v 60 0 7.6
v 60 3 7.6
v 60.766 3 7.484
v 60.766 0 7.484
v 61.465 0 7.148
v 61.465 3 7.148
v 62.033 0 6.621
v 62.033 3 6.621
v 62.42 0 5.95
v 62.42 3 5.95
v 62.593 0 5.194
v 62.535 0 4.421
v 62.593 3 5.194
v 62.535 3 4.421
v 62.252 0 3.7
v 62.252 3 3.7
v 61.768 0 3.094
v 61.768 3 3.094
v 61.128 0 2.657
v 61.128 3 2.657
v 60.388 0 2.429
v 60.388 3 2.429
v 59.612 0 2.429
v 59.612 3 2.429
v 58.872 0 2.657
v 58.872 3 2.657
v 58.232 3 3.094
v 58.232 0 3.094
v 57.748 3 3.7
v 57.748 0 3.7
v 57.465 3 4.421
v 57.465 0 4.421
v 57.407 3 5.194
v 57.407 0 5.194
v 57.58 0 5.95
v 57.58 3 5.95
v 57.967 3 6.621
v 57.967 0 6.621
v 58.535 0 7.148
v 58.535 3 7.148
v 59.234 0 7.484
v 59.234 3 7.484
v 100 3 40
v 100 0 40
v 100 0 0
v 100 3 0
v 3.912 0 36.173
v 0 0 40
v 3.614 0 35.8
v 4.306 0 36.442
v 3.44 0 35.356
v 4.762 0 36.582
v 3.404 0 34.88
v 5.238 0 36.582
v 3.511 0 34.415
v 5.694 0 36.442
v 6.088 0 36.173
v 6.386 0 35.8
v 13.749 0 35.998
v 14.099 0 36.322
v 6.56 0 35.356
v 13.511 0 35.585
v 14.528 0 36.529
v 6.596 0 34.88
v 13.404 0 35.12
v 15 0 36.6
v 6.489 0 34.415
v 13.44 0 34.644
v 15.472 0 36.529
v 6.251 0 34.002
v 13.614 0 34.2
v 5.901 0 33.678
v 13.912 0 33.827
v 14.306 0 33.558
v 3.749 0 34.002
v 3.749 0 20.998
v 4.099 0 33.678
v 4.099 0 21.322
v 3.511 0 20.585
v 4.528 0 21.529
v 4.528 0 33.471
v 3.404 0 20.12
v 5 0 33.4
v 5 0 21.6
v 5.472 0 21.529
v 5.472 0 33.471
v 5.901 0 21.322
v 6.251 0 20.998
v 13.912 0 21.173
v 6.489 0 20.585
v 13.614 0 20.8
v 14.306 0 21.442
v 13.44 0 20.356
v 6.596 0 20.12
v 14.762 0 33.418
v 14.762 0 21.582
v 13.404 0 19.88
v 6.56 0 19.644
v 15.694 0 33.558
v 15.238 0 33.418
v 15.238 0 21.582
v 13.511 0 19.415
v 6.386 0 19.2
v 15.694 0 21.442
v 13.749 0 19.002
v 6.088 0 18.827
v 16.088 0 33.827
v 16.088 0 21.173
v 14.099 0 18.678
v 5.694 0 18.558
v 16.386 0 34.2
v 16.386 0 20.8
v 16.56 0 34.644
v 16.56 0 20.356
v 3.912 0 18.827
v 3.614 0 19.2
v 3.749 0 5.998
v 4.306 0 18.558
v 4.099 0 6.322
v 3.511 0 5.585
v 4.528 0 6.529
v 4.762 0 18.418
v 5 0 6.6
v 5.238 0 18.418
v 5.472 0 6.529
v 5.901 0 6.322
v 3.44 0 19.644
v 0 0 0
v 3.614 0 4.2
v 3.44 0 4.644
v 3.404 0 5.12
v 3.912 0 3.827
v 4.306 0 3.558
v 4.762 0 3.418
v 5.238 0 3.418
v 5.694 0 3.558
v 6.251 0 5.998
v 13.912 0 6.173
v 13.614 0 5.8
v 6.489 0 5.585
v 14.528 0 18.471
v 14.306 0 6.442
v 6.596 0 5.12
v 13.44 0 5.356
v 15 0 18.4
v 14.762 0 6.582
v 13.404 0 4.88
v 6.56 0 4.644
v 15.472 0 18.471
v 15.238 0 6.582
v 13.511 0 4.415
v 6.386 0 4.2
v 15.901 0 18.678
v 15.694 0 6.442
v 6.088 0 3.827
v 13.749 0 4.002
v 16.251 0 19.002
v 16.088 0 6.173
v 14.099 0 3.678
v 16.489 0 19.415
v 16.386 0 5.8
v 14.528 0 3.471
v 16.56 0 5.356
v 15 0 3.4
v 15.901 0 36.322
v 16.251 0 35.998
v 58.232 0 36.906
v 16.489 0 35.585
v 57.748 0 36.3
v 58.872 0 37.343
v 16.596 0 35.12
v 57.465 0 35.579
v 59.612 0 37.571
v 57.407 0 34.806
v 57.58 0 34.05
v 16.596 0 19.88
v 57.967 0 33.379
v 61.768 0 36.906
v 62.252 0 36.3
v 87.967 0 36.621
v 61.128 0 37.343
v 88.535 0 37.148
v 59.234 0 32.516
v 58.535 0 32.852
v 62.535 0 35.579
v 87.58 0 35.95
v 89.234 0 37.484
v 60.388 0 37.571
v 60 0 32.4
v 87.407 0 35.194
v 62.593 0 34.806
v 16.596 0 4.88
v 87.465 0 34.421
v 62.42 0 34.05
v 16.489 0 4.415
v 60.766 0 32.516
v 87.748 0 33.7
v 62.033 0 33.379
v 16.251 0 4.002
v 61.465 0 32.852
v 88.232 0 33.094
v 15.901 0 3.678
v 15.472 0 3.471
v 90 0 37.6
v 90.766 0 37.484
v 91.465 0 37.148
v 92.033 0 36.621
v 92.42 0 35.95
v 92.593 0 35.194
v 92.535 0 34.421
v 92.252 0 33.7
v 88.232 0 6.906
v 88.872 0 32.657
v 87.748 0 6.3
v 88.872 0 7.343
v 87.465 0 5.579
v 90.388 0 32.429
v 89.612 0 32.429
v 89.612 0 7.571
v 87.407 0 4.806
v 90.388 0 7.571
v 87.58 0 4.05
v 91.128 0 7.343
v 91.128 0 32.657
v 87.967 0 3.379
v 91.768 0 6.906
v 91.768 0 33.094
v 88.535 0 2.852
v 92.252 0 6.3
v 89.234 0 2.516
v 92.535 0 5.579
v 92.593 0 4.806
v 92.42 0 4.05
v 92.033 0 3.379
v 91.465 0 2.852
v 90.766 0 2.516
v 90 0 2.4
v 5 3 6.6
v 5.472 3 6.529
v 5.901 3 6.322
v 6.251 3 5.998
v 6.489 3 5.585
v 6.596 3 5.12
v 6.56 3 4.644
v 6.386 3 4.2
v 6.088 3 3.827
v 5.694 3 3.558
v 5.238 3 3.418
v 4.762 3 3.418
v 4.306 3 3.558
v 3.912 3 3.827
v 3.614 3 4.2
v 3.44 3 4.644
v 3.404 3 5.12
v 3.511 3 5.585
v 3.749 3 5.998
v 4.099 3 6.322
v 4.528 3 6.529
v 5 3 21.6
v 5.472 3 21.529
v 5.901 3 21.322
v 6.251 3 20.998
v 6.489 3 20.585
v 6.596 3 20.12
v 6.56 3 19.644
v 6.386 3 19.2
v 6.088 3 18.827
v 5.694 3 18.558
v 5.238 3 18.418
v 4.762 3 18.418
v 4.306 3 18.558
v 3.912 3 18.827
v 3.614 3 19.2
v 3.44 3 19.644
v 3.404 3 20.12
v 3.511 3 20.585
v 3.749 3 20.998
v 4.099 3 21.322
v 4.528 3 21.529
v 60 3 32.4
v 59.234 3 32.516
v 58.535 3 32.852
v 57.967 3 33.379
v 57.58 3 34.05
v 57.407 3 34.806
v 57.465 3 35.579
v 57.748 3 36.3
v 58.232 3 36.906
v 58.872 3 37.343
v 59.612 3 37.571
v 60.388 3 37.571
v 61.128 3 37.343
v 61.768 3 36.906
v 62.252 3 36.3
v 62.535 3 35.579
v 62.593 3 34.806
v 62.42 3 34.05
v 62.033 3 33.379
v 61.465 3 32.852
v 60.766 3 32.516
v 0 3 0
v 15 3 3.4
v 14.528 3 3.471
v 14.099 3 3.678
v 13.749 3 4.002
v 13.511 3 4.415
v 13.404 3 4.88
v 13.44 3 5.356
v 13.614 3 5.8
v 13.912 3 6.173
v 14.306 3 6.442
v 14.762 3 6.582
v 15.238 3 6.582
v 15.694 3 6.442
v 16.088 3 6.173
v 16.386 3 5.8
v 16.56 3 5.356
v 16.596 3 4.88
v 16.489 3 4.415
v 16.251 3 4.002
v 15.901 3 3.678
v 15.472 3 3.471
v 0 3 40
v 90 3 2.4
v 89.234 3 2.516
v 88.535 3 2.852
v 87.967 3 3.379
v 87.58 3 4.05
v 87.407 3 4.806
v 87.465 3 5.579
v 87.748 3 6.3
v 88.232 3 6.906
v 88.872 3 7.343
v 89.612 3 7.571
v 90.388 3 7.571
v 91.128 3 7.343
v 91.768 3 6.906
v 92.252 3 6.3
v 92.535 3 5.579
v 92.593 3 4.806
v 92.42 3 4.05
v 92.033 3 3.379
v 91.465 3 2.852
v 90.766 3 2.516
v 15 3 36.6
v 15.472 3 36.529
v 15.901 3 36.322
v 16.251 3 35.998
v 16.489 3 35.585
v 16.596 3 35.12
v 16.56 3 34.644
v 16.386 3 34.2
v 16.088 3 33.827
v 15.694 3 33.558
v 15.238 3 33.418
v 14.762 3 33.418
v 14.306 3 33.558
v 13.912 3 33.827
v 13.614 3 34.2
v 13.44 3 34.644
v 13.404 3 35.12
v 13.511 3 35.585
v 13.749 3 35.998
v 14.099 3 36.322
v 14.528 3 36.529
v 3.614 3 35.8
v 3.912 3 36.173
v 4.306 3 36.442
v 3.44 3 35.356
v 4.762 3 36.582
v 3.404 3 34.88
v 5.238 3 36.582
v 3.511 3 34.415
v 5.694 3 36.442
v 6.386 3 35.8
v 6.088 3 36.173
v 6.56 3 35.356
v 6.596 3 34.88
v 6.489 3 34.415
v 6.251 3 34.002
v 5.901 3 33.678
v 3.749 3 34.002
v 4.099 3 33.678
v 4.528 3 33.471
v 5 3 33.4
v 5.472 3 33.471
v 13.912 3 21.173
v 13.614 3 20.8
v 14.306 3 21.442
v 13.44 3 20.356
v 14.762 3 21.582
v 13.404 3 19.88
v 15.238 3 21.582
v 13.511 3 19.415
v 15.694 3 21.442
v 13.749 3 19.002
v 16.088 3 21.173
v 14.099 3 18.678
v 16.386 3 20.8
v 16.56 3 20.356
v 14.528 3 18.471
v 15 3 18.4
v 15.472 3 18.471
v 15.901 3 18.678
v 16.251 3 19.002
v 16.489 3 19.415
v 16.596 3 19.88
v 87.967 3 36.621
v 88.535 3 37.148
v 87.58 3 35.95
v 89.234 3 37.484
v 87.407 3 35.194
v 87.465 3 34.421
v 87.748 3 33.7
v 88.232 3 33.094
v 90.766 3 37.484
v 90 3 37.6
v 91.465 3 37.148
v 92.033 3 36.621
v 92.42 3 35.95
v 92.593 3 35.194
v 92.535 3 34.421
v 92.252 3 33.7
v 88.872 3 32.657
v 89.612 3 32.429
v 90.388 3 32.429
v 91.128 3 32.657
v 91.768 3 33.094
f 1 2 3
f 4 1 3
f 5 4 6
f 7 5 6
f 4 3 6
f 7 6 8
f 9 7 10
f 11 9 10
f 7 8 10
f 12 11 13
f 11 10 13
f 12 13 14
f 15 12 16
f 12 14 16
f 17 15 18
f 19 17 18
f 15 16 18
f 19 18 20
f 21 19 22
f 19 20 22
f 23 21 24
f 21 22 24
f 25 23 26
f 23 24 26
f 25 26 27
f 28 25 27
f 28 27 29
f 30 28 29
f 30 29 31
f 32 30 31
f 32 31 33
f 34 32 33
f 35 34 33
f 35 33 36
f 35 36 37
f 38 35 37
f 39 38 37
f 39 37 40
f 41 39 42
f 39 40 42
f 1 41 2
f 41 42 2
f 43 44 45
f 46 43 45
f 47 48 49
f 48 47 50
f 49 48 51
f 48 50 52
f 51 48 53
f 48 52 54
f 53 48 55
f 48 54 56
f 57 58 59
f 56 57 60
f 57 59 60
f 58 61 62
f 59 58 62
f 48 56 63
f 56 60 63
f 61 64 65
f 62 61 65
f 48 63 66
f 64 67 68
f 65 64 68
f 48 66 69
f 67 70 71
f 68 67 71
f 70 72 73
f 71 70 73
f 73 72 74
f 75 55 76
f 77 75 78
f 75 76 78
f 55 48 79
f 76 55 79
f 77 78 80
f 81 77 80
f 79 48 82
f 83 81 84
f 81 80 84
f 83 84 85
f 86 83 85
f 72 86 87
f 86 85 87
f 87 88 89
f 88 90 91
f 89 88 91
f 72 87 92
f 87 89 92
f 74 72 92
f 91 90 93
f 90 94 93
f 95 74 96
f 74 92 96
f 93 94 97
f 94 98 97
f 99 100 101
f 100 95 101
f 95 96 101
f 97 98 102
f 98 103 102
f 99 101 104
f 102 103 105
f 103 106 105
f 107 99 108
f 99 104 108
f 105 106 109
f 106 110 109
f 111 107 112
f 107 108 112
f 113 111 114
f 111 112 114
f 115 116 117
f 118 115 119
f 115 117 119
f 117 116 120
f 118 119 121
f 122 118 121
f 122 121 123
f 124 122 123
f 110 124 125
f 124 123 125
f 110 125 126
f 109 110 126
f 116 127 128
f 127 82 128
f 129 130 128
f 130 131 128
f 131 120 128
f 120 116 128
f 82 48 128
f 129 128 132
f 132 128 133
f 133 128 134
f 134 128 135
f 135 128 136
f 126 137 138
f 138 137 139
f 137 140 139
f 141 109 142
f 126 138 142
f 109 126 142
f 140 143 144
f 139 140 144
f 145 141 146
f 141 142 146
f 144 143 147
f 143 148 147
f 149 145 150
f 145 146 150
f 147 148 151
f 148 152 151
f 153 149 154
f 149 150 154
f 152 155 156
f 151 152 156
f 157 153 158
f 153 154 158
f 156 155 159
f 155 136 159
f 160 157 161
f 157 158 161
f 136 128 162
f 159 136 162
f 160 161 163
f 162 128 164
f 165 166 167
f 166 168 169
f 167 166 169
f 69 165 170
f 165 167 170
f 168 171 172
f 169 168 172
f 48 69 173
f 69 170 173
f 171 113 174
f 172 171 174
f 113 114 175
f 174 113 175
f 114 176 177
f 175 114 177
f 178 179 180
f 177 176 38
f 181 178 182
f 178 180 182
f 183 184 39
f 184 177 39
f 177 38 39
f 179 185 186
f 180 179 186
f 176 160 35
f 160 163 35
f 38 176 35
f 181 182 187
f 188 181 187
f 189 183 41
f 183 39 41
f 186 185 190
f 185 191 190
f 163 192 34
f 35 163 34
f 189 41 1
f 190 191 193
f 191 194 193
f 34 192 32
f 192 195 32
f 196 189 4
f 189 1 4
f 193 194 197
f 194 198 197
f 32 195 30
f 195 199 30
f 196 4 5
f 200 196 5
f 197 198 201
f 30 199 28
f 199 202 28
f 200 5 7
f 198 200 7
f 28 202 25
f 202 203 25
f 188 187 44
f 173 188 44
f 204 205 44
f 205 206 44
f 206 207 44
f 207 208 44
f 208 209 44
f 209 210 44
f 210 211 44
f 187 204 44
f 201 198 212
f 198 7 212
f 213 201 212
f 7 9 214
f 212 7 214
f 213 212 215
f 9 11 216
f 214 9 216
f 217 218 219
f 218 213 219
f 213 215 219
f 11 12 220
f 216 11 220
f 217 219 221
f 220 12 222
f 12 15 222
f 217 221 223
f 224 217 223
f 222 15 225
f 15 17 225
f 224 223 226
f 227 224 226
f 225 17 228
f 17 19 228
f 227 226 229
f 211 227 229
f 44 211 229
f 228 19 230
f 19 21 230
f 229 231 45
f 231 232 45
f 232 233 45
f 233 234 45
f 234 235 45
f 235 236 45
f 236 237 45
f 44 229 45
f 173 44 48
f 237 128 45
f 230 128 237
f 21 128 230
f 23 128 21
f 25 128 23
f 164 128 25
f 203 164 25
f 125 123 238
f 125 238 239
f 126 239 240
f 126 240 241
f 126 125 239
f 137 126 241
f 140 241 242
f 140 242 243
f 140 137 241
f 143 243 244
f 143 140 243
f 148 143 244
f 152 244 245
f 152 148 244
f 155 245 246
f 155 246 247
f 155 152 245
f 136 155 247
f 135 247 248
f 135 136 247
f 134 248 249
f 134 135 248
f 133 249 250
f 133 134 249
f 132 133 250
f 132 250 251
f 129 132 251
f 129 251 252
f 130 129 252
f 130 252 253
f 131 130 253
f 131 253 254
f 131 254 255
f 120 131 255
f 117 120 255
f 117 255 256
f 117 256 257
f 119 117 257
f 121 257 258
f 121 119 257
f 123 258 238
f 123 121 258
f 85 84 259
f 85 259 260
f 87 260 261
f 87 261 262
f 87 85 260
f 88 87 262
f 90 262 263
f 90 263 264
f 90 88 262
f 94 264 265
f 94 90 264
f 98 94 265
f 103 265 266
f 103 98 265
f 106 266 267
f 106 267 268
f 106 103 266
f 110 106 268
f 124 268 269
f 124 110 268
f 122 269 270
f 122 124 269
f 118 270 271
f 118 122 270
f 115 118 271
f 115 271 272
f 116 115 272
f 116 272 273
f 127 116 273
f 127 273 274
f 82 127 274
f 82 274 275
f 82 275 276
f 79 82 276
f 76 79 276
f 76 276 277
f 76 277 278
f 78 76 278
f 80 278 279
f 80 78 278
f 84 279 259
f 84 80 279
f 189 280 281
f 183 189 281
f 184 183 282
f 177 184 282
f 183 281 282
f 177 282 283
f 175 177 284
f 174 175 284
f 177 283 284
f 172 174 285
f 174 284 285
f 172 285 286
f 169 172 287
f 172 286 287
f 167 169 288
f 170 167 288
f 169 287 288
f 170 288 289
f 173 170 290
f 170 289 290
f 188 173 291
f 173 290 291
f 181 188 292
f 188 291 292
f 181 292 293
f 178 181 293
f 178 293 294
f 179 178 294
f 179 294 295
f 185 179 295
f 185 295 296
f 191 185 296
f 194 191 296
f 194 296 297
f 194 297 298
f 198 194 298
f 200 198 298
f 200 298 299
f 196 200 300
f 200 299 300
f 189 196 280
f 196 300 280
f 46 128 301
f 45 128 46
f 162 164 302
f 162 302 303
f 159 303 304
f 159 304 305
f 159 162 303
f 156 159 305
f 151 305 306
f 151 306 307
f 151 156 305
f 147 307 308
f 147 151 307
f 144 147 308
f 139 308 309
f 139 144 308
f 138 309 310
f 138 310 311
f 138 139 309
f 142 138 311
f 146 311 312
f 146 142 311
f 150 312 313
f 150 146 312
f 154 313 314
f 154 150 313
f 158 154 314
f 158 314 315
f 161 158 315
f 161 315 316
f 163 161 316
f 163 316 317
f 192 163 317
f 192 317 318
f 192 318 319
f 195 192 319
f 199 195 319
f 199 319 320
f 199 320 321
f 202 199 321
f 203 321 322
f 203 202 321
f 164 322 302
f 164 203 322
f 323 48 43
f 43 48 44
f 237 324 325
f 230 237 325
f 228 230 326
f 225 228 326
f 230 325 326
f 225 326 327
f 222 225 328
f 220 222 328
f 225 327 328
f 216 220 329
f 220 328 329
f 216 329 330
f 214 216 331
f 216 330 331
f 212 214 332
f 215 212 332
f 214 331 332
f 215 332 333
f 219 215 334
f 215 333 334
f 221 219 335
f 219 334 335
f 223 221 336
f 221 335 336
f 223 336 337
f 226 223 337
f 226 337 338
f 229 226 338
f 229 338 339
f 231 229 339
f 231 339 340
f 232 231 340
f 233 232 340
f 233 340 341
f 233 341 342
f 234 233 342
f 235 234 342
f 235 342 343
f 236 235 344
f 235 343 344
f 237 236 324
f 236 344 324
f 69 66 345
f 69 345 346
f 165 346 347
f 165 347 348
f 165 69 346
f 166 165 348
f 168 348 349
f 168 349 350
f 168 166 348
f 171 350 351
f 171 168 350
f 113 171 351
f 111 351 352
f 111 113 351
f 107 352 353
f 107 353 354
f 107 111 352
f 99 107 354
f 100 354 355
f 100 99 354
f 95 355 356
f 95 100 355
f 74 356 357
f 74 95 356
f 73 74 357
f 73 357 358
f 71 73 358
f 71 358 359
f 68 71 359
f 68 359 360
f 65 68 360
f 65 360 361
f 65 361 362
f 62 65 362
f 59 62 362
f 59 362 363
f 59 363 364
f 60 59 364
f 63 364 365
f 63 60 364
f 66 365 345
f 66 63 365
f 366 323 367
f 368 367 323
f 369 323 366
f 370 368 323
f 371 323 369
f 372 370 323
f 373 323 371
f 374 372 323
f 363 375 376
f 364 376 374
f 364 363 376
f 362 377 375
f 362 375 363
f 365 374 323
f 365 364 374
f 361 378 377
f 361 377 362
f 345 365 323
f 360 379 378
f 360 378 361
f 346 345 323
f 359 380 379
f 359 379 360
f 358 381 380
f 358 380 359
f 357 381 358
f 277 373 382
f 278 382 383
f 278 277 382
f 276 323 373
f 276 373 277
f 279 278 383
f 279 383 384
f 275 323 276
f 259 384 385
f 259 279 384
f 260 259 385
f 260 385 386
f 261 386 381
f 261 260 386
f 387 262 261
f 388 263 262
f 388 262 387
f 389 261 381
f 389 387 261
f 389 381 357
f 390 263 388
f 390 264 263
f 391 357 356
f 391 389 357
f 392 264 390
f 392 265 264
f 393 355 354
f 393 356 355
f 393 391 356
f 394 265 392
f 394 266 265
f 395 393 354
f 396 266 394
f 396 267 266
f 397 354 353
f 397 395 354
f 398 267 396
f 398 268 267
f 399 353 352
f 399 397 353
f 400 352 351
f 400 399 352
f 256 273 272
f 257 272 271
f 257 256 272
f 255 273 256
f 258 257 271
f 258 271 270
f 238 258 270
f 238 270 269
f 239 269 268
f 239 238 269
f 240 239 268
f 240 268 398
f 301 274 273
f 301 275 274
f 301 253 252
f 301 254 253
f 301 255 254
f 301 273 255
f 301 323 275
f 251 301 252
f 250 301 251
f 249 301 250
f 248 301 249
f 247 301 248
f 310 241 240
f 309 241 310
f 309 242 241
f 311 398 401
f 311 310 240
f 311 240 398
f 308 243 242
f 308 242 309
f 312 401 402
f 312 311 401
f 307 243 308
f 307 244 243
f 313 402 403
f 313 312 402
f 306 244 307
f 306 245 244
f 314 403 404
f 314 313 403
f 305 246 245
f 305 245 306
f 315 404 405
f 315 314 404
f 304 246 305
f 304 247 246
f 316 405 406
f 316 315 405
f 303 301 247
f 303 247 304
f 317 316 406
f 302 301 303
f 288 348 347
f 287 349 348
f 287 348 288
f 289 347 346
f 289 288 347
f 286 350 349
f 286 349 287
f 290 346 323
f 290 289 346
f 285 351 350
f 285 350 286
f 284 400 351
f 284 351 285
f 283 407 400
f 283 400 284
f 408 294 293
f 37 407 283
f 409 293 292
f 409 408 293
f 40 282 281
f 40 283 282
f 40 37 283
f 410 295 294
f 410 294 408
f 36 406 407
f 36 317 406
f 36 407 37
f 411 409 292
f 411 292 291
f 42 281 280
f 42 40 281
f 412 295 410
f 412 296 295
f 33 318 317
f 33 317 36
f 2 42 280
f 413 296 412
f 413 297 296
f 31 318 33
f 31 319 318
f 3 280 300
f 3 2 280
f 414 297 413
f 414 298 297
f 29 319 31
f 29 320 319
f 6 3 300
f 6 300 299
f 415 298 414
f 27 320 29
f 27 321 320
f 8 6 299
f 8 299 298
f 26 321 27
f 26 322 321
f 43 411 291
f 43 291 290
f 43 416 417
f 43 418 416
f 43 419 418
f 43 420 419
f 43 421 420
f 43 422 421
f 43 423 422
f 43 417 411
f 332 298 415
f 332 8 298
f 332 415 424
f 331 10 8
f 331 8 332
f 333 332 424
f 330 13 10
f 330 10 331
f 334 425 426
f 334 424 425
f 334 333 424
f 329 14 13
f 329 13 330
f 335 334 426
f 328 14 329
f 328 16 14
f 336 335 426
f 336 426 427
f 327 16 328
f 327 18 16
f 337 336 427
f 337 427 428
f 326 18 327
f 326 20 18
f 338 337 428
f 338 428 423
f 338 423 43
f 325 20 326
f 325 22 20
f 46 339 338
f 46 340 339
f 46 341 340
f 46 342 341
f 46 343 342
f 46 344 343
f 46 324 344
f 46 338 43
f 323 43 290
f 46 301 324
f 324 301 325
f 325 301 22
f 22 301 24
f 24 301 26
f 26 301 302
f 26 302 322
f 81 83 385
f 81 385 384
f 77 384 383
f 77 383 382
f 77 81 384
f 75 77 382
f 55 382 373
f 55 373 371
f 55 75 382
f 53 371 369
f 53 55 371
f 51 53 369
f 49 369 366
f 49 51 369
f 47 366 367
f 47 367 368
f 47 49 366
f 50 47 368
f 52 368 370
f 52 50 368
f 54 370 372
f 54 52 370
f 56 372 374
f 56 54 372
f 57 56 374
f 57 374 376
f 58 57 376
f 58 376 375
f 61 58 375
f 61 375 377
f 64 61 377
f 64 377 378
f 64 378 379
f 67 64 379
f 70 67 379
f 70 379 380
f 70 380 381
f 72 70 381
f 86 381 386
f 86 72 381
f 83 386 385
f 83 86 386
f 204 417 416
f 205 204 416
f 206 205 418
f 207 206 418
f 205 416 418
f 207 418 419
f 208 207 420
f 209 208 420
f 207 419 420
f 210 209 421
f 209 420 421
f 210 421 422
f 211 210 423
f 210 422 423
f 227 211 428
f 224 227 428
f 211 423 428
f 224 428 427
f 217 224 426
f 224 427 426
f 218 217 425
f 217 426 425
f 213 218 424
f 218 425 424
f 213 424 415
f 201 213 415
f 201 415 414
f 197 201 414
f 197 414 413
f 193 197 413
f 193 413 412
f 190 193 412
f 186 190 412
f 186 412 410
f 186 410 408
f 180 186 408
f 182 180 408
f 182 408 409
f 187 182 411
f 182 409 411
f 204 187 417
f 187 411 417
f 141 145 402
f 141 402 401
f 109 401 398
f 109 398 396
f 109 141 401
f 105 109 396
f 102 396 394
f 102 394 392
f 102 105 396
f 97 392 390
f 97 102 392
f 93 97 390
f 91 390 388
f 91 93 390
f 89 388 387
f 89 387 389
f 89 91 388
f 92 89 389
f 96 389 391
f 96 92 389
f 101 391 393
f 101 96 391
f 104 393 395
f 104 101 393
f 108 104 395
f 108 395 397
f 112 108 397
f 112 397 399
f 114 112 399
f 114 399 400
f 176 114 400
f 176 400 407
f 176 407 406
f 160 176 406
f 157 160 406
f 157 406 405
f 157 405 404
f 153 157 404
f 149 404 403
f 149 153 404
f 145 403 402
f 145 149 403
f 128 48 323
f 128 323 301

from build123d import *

# Parameters (mm, degrees)
SKETCH_1_W          = 100
SKETCH_1_H          = 40
SKETCH_1_R          = 1.6
EXTRUDE_1_DEPTH     = 3
SKETCH_2_R          = 2.6
CUT_EXTRUDE_1_DEPTH = 3


with BuildPart() as part:
    # 草图1 → 凸台-拉伸1 (new body)
    with BuildSketch(Plane(origin=(0, 0, 0), x_dir=(1, 0, 0), z_dir=(0, 1, 0))):
        with Locations((50, -20)):
            Rectangle(SKETCH_1_W, SKETCH_1_H)
        with Locations(Location((5, -20, 0), (0, 0, 270))):
            Circle(SKETCH_1_R, mode=Mode.SUBTRACT)
        with Locations(Location((5, -5, 0), (0, 0, 270))):
            Circle(SKETCH_1_R, mode=Mode.SUBTRACT)
        with Locations(Location((15, -20, 0), (0, 0, 90))):
            Circle(SKETCH_1_R, mode=Mode.SUBTRACT)
        with Locations(Location((15, -5, 0), (0, 0, 90))):
            Circle(SKETCH_1_R, mode=Mode.SUBTRACT)
        with Locations(Location((15, -35, 0), (0, 0, 270))):
            Circle(SKETCH_1_R, mode=Mode.SUBTRACT)
        with Locations(Location((5, -35, 0), (0, 0, 90))):
            Circle(SKETCH_1_R, mode=Mode.SUBTRACT)
    extrude(amount=EXTRUDE_1_DEPTH)

    # 草图2 → 切除-拉伸1 (cut)
    with BuildSketch(Plane(origin=(0, 3, 0), x_dir=(1, 0, 0), z_dir=(0, 1, 0))):
        with Locations(Location((60, -5, 0), (0, 0, 270))):
            Circle(SKETCH_2_R)
        with Locations(Location((60, -35, 0), (0, 0, 90))):
            Circle(SKETCH_2_R)
        with Locations(Location((90, -35, 0), (0, 0, 270))):
            Circle(SKETCH_2_R)
        with Locations(Location((90, -5, 0), (0, 0, 90))):
            Circle(SKETCH_2_R)
    extrude(amount=-CUT_EXTRUDE_1_DEPTH, mode=Mode.SUBTRACT)


solid = part.part
